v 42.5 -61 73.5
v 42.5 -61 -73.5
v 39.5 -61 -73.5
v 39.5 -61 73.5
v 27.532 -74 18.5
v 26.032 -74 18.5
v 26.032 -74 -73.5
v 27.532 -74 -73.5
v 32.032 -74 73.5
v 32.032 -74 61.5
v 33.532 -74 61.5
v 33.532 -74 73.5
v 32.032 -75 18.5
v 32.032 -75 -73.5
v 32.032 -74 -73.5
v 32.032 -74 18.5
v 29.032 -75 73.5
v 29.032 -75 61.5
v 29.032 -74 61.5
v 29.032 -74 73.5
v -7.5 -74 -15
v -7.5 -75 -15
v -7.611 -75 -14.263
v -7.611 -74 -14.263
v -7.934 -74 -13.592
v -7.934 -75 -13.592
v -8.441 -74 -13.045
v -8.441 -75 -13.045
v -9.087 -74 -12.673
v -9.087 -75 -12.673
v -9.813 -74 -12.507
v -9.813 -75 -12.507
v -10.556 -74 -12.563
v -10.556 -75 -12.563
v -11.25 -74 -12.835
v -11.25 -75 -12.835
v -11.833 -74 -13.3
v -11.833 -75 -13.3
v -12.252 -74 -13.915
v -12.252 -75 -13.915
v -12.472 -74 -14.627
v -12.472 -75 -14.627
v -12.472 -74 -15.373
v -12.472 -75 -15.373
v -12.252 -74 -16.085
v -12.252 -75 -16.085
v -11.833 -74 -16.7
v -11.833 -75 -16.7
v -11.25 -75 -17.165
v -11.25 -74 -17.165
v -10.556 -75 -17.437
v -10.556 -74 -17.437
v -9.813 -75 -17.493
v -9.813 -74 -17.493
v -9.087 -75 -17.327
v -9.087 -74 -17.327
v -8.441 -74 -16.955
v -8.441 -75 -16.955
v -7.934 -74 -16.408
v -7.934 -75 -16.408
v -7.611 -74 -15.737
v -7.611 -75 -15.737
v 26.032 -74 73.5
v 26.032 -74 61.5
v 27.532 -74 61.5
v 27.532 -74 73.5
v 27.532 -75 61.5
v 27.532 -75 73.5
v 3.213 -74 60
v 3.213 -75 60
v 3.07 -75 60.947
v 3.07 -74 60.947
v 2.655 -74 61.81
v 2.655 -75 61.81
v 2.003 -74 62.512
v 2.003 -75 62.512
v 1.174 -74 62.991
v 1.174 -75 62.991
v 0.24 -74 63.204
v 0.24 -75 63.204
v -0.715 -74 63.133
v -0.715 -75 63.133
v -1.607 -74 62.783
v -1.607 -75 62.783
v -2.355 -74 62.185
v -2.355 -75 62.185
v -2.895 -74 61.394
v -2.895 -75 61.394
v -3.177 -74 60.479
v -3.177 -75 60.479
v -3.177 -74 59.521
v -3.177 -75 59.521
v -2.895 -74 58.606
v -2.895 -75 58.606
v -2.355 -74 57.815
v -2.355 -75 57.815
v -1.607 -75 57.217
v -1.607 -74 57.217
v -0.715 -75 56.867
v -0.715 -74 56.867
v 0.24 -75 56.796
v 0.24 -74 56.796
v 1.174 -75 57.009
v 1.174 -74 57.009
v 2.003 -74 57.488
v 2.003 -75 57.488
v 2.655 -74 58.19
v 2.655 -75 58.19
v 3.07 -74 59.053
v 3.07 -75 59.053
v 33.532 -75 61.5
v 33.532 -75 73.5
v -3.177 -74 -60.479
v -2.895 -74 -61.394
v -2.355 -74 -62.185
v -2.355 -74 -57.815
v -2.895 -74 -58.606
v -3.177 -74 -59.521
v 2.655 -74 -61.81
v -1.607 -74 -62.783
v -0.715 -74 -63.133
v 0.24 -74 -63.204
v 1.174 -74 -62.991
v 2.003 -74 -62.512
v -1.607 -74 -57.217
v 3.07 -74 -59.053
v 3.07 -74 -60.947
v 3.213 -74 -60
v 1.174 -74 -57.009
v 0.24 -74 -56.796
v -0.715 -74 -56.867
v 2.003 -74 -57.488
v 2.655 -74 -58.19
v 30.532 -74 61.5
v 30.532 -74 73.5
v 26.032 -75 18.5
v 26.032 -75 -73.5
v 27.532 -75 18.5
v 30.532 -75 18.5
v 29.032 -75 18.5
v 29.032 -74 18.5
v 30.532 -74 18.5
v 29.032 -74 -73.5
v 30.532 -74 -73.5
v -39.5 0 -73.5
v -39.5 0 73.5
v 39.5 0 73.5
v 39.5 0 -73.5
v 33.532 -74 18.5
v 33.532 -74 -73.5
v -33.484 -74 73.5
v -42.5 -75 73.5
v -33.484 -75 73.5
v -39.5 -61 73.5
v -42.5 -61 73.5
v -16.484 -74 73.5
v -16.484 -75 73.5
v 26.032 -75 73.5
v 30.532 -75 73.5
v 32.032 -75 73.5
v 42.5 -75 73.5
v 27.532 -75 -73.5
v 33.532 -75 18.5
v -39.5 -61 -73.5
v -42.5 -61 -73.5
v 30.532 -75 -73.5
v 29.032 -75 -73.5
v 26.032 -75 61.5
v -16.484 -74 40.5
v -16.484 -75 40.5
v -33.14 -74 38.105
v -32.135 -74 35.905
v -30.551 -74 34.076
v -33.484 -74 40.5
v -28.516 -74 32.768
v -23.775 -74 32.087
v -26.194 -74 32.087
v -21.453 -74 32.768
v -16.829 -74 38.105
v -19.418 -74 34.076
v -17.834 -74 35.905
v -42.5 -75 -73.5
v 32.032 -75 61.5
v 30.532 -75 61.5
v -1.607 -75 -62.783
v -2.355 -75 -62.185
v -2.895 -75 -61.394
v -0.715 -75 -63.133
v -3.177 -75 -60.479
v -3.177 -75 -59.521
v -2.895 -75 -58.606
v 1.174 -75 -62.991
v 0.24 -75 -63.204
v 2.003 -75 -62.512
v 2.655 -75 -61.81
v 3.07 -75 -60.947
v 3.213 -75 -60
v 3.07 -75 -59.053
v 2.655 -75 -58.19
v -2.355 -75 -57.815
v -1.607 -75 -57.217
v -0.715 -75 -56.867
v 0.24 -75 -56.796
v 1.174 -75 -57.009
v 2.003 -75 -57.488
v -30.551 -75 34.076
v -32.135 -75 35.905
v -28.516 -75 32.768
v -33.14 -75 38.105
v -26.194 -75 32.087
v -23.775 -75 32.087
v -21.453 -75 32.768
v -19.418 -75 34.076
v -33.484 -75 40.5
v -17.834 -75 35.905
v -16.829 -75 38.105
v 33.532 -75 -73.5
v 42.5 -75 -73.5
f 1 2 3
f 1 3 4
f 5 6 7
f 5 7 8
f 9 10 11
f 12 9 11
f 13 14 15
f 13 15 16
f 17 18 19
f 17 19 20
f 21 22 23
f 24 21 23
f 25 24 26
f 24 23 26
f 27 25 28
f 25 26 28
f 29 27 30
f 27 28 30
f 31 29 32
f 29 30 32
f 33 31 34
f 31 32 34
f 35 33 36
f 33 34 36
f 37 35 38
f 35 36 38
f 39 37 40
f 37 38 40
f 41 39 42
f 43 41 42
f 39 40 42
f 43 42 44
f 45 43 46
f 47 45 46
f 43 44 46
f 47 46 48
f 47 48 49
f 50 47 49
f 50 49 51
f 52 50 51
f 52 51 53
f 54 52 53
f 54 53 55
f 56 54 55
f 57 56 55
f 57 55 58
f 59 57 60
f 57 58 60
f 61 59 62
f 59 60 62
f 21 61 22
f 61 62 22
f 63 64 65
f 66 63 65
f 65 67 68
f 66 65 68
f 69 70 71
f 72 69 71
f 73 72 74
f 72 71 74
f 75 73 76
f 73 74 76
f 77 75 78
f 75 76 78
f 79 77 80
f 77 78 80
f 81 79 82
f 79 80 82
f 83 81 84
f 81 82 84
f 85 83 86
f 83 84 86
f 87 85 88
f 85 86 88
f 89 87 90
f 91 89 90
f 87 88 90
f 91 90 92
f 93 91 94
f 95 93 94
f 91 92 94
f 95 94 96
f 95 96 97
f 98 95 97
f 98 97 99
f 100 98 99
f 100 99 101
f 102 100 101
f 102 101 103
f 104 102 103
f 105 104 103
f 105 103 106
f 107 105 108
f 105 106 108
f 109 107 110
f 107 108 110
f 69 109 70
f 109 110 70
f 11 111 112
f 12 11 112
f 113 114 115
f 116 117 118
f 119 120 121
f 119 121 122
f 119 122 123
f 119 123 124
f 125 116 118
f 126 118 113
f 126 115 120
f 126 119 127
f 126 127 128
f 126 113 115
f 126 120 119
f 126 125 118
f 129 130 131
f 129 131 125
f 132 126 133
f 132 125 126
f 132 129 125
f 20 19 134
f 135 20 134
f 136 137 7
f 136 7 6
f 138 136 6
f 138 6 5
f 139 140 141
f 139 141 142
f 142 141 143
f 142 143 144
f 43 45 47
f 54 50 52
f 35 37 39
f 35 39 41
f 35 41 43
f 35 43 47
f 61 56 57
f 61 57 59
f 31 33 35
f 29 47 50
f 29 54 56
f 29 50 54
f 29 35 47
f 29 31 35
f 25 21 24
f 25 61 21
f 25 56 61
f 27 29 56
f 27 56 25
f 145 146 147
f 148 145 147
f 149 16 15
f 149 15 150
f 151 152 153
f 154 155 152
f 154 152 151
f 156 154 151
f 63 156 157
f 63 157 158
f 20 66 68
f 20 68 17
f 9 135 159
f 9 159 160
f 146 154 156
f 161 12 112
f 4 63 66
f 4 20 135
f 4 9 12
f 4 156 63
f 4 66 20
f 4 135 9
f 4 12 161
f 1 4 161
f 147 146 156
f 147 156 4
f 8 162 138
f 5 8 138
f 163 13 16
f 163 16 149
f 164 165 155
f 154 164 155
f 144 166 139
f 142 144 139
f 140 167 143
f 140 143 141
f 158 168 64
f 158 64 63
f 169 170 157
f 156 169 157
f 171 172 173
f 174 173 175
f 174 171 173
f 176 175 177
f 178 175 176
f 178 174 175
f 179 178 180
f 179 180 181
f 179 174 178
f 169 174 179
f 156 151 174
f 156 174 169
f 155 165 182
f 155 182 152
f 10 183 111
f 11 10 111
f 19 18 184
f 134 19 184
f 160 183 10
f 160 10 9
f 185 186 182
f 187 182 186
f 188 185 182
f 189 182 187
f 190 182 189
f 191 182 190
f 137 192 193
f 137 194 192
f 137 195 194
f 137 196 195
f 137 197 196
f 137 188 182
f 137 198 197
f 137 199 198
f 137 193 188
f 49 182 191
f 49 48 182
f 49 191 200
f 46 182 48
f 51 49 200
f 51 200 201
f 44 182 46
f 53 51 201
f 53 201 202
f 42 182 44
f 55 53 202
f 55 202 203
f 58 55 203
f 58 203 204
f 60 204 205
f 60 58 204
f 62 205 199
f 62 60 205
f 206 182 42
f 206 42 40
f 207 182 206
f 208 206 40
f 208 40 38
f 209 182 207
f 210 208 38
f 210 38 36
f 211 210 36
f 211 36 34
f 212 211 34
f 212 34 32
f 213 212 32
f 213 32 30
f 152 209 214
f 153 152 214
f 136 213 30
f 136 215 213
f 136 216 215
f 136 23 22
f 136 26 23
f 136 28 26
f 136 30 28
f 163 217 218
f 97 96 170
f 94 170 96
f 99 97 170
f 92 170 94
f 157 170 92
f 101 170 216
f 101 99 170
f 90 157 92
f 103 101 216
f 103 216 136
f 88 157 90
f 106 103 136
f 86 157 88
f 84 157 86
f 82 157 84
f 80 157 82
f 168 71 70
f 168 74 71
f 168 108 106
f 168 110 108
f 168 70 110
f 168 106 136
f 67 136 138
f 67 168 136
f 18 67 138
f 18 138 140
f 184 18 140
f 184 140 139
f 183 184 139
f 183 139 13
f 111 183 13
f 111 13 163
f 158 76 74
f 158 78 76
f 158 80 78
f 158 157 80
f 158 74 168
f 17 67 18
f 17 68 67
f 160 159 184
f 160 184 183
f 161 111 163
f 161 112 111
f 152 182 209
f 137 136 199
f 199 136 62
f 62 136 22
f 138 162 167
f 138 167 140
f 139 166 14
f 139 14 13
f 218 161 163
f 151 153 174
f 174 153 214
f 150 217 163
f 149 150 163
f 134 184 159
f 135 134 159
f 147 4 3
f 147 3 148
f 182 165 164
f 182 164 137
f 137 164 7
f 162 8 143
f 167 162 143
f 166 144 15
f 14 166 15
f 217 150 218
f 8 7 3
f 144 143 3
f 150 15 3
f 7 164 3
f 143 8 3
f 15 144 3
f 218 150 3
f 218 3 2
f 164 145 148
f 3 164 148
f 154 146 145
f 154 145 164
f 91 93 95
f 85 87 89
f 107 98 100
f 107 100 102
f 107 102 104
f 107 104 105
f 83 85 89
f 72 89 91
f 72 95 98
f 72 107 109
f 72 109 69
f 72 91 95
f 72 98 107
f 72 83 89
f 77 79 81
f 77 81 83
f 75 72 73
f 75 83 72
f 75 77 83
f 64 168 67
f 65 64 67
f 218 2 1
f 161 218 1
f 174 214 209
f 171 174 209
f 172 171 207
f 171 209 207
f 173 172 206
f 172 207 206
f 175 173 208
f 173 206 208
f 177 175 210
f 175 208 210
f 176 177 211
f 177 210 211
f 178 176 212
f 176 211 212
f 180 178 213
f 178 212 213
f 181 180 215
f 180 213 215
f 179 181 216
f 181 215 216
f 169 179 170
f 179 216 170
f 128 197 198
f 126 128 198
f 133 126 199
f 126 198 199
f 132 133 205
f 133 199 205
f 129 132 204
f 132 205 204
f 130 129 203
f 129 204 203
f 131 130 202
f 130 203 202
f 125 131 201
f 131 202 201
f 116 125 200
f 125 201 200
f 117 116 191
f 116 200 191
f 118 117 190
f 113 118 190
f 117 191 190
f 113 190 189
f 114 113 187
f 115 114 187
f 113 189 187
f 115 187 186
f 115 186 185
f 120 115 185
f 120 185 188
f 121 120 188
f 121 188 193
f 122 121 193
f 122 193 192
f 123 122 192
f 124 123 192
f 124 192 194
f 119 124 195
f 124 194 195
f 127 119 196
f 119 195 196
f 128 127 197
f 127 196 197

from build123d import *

# Parameters (mm, degrees)
F0_W     = 85
F0_H     = 147
F1_DEPTH = 75
F2_W     = 1.5
F2_H     = 92
F2_R     = 3.213136
F2_R_2   = 2.5
F2_H_2   = 12
F3_DEPTH = 1
F4_W     = 61
F4_H     = 147
F5_DEPTH = 3
F6_W     = 61
F6_H     = 147
F7_DEPTH = 3


with BuildPart() as f1:
    # F0 (on Front) → F1 (new body)
    with BuildSketch(Plane.XZ):
        Rectangle(F0_W, F0_H)
    extrude(amount=F1_DEPTH)

    # F2 (on face) → F3 (cut)
    with BuildSketch(Plane.XZ.offset(75)):
        with Locations((26.781611, -27.5)):
            Rectangle(F2_W, F2_H)
        with Locations((29.781611, -27.5)):
            Rectangle(F2_W, F2_H)
        with Locations((32.781611, -27.5)):
            Rectangle(F2_W, F2_H)
        with Locations((0, -60)):
            Circle(F2_R)
        with Locations((-10, -15)):
            Circle(F2_R_2)
        with Locations((0, 60)):
            Circle(F2_R)
        with BuildLine():
            Line((-16.484489, 73.5), (-33.484489, 73.5))
            Line((-33.484489, 73.5), (-33.484489, 40.5))
            ThreePointArc((-33.484489, 40.5), (-24.984489, 32), (-16.484489, 40.5))
            Line((-16.484489, 40.5), (-16.484489, 73.5))
        make_face()
        with Locations((26.781611, 67.5)):
            Rectangle(F2_W, F2_H_2)
        with Locations((29.781611, 67.5)):
            Rectangle(F2_W, F2_H_2)
        with Locations((32.781611, 67.5)):
            Rectangle(F2_W, F2_H_2)
    extrude(amount=-F3_DEPTH, mode=Mode.SUBTRACT)

    # F4 (on face) → F5 (cut)
    with BuildSketch(Plane(origin=(-42.5, 0, 0), x_dir=(0, -1, 0), z_dir=(-1, 0, 0))):
        with Locations((30.5, 0)):
            Rectangle(F4_W, F4_H)
    extrude(amount=-F5_DEPTH, mode=Mode.SUBTRACT)

    # F6 (on face) → F7 (cut)
    with BuildSketch(Plane.YZ.offset(42.5)):
        with Locations((-30.5, 0)):
            Rectangle(F6_W, F6_H)
    extrude(amount=-F7_DEPTH, mode=Mode.SUBTRACT)


solid = f1.part
